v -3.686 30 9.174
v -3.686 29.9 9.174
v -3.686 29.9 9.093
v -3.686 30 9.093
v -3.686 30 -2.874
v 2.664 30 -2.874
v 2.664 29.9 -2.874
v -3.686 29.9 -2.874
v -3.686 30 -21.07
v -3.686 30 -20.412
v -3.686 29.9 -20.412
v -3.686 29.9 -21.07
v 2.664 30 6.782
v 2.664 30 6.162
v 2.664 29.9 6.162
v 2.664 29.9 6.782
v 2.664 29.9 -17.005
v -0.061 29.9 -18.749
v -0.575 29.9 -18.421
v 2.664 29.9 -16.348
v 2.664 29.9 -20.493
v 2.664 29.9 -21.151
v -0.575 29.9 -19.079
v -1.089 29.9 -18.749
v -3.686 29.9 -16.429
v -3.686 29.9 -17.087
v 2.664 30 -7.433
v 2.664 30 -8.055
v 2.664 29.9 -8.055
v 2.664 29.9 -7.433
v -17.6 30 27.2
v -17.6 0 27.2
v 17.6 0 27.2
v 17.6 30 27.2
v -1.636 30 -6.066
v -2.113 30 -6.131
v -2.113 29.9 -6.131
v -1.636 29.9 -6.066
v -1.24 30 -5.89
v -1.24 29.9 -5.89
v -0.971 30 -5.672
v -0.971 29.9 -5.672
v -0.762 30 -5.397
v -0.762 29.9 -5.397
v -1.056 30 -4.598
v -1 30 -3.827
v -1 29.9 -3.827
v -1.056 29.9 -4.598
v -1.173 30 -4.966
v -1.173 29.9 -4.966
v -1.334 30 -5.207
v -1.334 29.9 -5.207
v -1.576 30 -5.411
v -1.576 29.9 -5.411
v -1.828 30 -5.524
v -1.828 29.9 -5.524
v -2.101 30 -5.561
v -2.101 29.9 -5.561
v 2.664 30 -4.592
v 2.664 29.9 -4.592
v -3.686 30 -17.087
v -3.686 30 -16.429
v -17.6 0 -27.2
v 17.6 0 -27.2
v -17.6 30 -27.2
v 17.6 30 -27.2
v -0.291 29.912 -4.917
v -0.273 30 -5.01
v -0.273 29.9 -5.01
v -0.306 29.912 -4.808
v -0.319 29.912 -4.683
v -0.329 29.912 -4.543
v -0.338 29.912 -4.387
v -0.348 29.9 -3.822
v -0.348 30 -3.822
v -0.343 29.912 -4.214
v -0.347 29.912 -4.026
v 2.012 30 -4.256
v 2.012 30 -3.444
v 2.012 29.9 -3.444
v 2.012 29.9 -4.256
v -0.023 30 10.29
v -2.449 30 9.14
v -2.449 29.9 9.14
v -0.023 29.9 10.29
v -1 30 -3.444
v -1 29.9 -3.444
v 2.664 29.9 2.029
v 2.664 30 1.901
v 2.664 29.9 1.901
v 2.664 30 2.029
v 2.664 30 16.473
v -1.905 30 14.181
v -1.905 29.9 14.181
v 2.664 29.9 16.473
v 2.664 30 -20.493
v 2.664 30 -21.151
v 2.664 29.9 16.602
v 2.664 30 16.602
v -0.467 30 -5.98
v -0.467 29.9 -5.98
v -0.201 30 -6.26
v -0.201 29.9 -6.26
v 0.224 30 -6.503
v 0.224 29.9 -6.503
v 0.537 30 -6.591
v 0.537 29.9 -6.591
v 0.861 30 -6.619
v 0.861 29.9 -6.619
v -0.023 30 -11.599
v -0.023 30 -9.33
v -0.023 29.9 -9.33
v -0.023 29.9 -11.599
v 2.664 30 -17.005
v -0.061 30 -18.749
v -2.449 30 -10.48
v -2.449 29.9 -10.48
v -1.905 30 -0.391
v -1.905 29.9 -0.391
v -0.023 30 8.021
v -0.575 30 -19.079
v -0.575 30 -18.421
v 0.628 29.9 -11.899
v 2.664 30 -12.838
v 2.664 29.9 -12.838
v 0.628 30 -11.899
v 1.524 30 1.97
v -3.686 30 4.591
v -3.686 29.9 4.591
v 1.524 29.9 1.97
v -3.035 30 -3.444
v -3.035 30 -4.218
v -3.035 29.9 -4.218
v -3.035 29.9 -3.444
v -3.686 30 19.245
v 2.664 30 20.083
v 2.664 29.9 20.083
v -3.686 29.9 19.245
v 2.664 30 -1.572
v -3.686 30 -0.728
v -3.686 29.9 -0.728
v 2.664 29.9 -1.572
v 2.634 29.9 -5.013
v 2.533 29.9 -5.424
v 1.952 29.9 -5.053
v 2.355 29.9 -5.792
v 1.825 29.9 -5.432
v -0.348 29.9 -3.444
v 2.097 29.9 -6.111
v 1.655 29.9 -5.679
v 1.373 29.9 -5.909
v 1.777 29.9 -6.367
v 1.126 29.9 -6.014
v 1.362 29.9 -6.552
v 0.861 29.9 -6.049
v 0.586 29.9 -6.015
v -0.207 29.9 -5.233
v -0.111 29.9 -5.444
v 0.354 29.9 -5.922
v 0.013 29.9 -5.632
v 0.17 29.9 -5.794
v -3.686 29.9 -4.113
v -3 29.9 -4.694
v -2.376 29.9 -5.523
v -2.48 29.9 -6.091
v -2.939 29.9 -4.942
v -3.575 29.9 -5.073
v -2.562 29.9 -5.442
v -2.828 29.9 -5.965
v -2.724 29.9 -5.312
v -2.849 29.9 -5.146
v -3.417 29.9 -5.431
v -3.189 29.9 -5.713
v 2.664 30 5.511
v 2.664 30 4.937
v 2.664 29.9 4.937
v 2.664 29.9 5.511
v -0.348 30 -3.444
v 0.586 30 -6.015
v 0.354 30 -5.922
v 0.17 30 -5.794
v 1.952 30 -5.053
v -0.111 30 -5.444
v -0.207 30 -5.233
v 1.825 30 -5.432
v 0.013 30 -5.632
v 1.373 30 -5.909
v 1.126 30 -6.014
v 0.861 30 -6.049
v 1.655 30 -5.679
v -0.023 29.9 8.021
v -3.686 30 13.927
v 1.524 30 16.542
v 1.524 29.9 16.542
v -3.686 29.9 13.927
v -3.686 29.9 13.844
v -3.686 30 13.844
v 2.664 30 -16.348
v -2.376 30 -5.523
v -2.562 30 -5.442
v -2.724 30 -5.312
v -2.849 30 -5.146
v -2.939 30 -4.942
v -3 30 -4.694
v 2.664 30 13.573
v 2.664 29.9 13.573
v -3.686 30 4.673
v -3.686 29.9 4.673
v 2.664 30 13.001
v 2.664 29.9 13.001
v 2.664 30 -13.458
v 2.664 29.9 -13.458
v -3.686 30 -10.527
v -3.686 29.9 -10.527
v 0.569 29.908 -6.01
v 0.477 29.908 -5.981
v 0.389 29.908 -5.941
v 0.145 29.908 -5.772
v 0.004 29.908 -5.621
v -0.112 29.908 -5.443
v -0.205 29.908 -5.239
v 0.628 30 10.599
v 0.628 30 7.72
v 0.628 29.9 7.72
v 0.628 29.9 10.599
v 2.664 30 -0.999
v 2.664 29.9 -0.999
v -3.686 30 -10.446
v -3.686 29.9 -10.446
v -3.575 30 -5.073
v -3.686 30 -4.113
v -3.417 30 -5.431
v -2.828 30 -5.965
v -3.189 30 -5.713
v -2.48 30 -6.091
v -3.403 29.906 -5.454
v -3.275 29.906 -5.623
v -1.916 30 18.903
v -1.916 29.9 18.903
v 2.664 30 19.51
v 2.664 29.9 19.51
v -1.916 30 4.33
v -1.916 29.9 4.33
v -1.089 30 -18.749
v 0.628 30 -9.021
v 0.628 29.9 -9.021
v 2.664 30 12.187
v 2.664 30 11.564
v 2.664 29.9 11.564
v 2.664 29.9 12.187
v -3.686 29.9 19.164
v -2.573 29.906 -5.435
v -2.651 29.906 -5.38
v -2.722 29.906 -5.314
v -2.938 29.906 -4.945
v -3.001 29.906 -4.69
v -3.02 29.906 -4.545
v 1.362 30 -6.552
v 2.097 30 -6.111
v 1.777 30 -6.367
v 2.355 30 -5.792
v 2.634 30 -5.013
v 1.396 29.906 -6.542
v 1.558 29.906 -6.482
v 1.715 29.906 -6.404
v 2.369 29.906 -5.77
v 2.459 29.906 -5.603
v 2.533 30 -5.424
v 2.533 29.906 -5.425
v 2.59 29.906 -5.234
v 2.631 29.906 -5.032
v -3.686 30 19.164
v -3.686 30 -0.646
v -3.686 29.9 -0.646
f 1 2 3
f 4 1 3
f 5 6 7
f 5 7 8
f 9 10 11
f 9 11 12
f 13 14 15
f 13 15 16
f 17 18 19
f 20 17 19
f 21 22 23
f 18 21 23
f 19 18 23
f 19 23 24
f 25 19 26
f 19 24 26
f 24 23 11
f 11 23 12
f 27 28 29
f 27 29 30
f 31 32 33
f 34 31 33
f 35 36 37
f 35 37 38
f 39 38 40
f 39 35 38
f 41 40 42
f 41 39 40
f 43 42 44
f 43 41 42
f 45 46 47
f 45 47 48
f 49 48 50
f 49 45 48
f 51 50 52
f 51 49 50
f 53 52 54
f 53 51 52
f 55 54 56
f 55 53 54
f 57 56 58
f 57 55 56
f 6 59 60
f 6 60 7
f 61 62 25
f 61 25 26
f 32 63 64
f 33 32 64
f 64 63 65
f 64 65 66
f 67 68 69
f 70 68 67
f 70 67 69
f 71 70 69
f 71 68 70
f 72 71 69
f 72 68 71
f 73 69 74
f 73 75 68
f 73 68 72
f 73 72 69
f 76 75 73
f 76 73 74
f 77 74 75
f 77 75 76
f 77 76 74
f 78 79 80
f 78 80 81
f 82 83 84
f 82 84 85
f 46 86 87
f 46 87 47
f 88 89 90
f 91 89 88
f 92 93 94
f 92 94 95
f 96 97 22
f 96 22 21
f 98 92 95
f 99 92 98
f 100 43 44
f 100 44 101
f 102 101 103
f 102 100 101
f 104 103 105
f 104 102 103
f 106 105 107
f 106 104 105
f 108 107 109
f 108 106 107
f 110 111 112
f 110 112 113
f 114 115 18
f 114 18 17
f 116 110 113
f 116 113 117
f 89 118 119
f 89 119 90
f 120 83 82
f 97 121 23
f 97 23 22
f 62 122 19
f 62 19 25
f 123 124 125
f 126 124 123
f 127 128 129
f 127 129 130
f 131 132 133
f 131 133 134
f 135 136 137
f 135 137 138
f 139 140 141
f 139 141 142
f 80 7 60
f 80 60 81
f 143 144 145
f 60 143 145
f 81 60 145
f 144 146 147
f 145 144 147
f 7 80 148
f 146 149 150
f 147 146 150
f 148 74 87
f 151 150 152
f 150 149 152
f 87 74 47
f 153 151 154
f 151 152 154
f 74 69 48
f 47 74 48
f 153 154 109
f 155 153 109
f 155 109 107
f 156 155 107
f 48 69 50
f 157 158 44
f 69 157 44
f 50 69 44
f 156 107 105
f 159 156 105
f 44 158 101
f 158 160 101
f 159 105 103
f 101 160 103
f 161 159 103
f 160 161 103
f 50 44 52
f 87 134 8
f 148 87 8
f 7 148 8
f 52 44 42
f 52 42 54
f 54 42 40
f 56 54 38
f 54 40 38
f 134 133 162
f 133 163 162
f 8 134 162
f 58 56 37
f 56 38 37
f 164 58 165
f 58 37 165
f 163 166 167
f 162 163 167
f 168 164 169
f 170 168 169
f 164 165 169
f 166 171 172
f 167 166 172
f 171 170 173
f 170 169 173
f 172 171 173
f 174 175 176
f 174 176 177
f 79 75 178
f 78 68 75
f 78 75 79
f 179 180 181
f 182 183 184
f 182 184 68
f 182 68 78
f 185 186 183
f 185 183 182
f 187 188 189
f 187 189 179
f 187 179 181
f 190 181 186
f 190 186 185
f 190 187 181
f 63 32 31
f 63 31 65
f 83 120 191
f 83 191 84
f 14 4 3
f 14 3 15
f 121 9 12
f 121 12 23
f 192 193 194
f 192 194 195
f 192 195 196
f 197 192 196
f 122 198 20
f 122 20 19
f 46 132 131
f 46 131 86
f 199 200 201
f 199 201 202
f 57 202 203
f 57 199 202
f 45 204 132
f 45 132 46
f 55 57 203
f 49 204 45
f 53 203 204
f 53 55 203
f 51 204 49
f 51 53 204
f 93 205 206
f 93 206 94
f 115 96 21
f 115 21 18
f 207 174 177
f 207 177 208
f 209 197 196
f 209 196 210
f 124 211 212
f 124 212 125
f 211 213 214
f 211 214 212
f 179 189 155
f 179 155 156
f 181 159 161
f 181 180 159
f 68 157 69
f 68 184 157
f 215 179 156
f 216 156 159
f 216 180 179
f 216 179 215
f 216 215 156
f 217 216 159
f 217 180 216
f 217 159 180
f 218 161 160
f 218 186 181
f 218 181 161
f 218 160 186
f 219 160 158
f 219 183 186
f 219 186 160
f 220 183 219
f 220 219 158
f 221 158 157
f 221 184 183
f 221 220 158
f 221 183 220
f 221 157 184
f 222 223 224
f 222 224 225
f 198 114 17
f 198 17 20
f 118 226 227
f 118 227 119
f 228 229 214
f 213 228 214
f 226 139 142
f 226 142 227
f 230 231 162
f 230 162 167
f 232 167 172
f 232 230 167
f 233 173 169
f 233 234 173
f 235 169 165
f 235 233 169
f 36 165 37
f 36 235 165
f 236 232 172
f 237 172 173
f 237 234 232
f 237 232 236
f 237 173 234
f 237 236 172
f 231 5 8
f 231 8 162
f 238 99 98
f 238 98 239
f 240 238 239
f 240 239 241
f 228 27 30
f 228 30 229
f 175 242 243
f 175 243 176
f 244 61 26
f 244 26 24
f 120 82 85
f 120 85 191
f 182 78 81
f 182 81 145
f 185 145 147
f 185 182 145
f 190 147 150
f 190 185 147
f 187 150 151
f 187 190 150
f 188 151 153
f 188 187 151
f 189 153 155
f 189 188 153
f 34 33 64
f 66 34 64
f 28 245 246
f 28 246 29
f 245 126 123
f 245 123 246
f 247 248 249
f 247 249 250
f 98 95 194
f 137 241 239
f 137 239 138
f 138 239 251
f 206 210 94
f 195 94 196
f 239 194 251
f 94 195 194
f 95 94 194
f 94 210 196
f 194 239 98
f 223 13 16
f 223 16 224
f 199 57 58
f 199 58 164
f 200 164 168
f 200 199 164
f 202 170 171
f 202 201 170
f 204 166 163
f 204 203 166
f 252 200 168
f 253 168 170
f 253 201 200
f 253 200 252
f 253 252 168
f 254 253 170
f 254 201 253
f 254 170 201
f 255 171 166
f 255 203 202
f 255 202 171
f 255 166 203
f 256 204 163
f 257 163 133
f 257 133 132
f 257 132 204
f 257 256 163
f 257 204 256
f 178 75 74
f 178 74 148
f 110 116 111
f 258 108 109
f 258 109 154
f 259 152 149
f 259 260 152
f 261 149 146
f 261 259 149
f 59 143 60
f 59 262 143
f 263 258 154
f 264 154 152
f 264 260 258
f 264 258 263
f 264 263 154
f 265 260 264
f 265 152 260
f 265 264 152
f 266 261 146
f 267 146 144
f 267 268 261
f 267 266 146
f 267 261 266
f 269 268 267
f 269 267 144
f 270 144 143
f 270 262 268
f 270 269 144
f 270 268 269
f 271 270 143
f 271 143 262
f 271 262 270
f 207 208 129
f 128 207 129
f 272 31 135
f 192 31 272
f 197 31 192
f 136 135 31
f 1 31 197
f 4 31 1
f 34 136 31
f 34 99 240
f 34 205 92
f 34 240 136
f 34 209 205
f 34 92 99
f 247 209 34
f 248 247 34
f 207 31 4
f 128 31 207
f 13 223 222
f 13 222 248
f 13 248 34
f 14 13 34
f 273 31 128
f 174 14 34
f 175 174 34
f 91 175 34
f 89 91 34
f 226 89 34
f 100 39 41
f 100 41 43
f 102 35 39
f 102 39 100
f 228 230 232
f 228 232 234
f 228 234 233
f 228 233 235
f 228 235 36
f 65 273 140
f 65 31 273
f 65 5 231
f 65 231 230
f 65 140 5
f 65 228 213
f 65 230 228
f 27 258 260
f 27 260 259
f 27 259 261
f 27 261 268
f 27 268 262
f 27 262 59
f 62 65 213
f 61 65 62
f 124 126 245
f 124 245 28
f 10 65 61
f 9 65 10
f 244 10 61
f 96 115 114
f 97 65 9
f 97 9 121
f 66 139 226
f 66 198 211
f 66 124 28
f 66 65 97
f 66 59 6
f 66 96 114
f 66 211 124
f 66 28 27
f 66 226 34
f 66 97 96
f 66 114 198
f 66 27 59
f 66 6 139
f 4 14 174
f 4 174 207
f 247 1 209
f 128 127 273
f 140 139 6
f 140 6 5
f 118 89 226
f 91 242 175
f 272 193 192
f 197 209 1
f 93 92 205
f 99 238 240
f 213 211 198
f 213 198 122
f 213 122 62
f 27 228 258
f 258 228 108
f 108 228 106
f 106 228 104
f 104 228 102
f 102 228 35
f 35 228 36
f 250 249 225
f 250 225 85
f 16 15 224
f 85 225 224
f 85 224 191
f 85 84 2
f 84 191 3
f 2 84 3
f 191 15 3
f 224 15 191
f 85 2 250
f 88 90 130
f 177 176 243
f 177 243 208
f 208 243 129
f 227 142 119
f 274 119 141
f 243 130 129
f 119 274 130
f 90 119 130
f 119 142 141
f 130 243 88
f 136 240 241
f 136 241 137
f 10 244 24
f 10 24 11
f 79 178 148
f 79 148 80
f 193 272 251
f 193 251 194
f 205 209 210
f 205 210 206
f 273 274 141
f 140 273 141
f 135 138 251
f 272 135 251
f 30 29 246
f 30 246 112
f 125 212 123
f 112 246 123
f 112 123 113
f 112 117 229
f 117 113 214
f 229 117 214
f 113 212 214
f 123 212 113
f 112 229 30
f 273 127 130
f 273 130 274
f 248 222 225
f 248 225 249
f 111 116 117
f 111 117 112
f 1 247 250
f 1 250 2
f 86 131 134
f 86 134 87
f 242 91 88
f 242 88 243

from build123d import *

# Parameters (mm, degrees)
SKETCH1_W           = 35.2
SKETCH1_H           = 54.4
BOSS_EXTRUDE1_DEPTH = 30
CUT_EXTRUDE1_DEPTH  = 0.1


with BuildPart() as part:
    # Sketch1 → Boss-Extrude1 (new body)
    with BuildSketch(Plane(origin=(0, 0, 0), x_dir=(1, 0, 0), z_dir=(0, 1, 0))):
        Rectangle(SKETCH1_W, SKETCH1_H)
    extrude(amount=BOSS_EXTRUDE1_DEPTH)

    # Sketch2 → Cut-Extrude1 (cut)
    # profile 1 of 6: a face of its own
    with BuildSketch(Plane(origin=(0, 30, 0), x_dir=(1, 0, 0), z_dir=(0, 1, 0))):
        Polygon((2.663738641, -20.083303144), (-3.686261359, -19.24503191), (-3.686261359, -19.163621654), (1.523995051, -16.54195699), (-3.686261359, -13.926652503), (-3.686261359, -13.843970211), (2.663738641, -13.000610836), (2.663738641, -13.573026702), (-1.905412, -14.181059554), (2.663738641, -16.473267086), (2.663738641, -16.601742647), (-1.915588282, -18.902854426), (2.663738641, -19.509615243), align=None)
    # profile 2 of 6: a face of its own
    with BuildSketch(Plane(origin=(0, 30, 0), x_dir=(1, 0, 0), z_dir=(0, 1, 0))):
        Polygon((-3.686261359, -9.092918529), (2.663738641, -6.162149298), (2.663738641, -6.781630468), (0.62848223, -7.720392487), (0.62848223, -10.599008272), (2.663738641, -11.564483032), (2.663738641, -12.186508272), (-3.686261359, -9.174328785), align=None)
        Polygon((-2.448571055, -9.139983833), (-0.022799821, -10.289903705), (-0.022799821, -8.020592808), align=None, mode=Mode.SUBTRACT)
    # profile 3 of 6: a face of its own
    with BuildSketch(Plane(origin=(0, 30, 0), x_dir=(1, 0, 0), z_dir=(0, 1, 0))):
        Polygon((2.663738641, -5.510867247), (-3.686261359, -4.672596013), (-3.686261359, -4.591185756), (1.523995051, -1.969521093), (-3.686261359, 0.645783394), (-3.686261359, 0.728465686), (2.663738641, 1.571825061), (2.663738641, 0.999409196), (-1.905412, 0.391376343), (2.663738641, -1.900831189), (2.663738641, -2.02930675), (-1.915588282, -4.330418529), (2.663738641, -4.937179346), align=None)
    # profile 4 of 6: a face of its own
    with BuildSketch(Plane(origin=(0, 30, 0), x_dir=(1, 0, 0), z_dir=(0, 1, 0))):
        with BuildLine():
            Line((-3.686261359, 2.874389164), (-3.686261359, 4.113351503))
            add(Edge.make_bspline(
                [(-3.686261359, 4.113351503), (-3.685947518, 4.17400127), (-3.685339215, 4.291555613), (-3.675685885, 4.462483602), (-3.662852695, 4.622637187), (-3.641325711, 4.771733359), (-3.619005068, 4.910742263), (-3.586243707, 5.038252668), (-3.55005759, 5.15533263), (-3.494380339, 5.295921701), (-3.407912866, 5.455439265), (-3.279673387, 5.626890799), (-3.125924606, 5.775926934), (-2.950715744, 5.902651825), (-2.75796614, 6.004351247), (-2.551822866, 6.076995491), (-2.335754034, 6.12366492), (-2.187618873, 6.128404243), (-2.112753747, 6.13079942)],
                knots=[0, 0, 0, 0, 1.00128172, 1.940733171, 2.826250472, 3.653024905, 4.427672124, 5.149348099, 5.824709082, 6.450061444, 7.643590664, 8.808605388, 9.972104426, 11.165284501, 12.367876273, 13.557044126, 14.765369432, 16, 16, 16, 16], degree=3))
            add(Edge.make_bspline(
                [(-2.112753747, 6.13079942), (-2.042630051, 6.128804412), (-1.904830375, 6.124884033), (-1.703630007, 6.087852701), (-1.512300219, 6.029078685), (-1.33100476, 5.947850624), (-1.163118461, 5.843192811), (-1.009161388, 5.717798041), (-0.874952272, 5.567137227), (-0.79995004, 5.454201374), (-0.761852305, 5.396835077)],
                knots=[0, 0, 0, 0, 1.044641374, 2.052818814, 3.038628718, 4.023282556, 5.005660861, 5.98021751, 6.974042014, 8, 8, 8, 8], degree=3))
            add(Edge.make_bspline(
                [(-0.761852305, 5.396835077), (-0.734148267, 5.468964887), (-0.681143581, 5.606967082), (-0.587578442, 5.796987788), (-0.485443149, 5.960105657), (-0.375629467, 6.099507114), (-0.255516262, 6.218101669), (-0.124127669, 6.320811412), (0.018428749, 6.409605986), (0.171629053, 6.485169554), (0.334174493, 6.544525679), (0.504079737, 6.588151608), (0.680693455, 6.613957294), (0.80054706, 6.617477585), (0.861264682, 6.619260959)],
                knots=[0, 0, 0, 0, 1.272586185, 2.434772614, 3.483318042, 4.437947805, 5.351807173, 6.25737843, 7.180033415, 8.1141739, 9.066731021, 10.025721652, 10.999834114, 12, 12, 12, 12], degree=3))
            add(Edge.make_bspline(
                [(0.861264682, 6.619260959), (0.923253403, 6.617489068), (1.045217946, 6.614002824), (1.224384373, 6.588270771), (1.395620732, 6.544731726), (1.559955701, 6.484656401), (1.717044728, 6.40678878), (1.86631873, 6.310656843), (2.008088271, 6.19761009), (2.142603557, 6.069848985), (2.265689272, 5.92746923), (2.371501477, 5.770557575), (2.462484894, 5.603412637), (2.536560348, 5.423897625), (2.593709512, 5.232470806), (2.633526759, 5.029238698), (2.660400578, 4.814535995), (2.662607073, 4.667197225), (2.663738641, 4.59163676)],
                knots=[0, 0, 0, 0, 0.978680899, 1.925582087, 2.851223405, 3.764209995, 4.683484765, 5.614004905, 6.562443559, 7.542772147, 8.539900013, 9.527881485, 10.525548727, 11.540192123, 12.58875426, 13.674701727, 14.807505862, 16, 16, 16, 16], degree=3))
            Line((2.663738641, 4.59163676), (2.663738641, 2.874389164))
            Line((2.663738641, 2.874389164), (-3.686261359, 2.874389164))
        make_face()
        with BuildLine():
            Line((-3.034979308, 3.444260959), (-0.999722898, 3.444260959))
            Line((-0.999722898, 3.444260959), (-0.999722898, 3.827143571))
            add(Edge.make_bspline(
                [(-0.999722898, 3.827143571), (-1.000448472, 3.8831121), (-1.00185043, 3.991254703), (-1.005866384, 4.147863657), (-1.017111401, 4.293233338), (-1.028353206, 4.427112788), (-1.046631335, 4.549291282), (-1.068388642, 4.659497805), (-1.091398506, 4.759463042), (-1.130534038, 4.874739232), (-1.188353511, 5.005518464), (-1.278171729, 5.144843329), (-1.385066749, 5.268239823), (-1.509562523, 5.371191651), (-1.645160313, 5.456193757), (-1.790669697, 5.515740405), (-1.943162486, 5.555438382), (-2.048051128, 5.559079134), (-2.10130543, 5.560927625)],
                knots=[0, 0, 0, 0, 1.156917035, 2.235399477, 3.236897345, 4.169954739, 5.01148057, 5.788325709, 6.491867502, 7.129259015, 8.302032419, 9.437271567, 10.542795419, 11.662606952, 12.764338259, 13.836858145, 14.901724648, 16, 16, 16, 16], degree=3))
            add(Edge.make_bspline(
                [(-2.10130543, 5.560927625), (-2.13655395, 5.559989075), (-2.205697771, 5.558148007), (-2.306820964, 5.542521884), (-2.401839674, 5.517203418), (-2.491665842, 5.48291539), (-2.574067073, 5.436072855), (-2.65298071, 5.381776203), (-2.723680212, 5.314739278), (-2.789569329, 5.2389816), (-2.848539868, 5.152301304), (-2.897387819, 5.052830862), (-2.941660294, 4.943141736), (-2.97443389, 4.820258001), (-3.00325313, 4.686725849), (-3.021360451, 4.540737206), (-3.033012685, 4.38321717), (-3.034309145, 4.27407557), (-3.034979308, 4.217658394)],
                knots=[0, 0, 0, 0, 0.911708768, 1.788416306, 2.640049961, 3.452993646, 4.268229297, 5.087074648, 5.92553149, 6.781184137, 7.681934069, 8.628939405, 9.643570426, 10.73771997, 11.914765019, 13.176320755, 14.540391495, 16, 16, 16, 16], degree=3))
            Line((-3.034979308, 4.217658394), (-3.034979308, 3.444260959))
        make_face(mode=Mode.SUBTRACT)
        with BuildLine():
            Line((-0.348440847, 3.444260959), (2.012456589, 3.444260959))
            Line((2.012456589, 3.444260959), (2.012456589, 4.255819452))
            add(Edge.make_bspline(
                [(2.012456589, 4.255819452), (2.011691133, 4.313904856), (2.010215818, 4.425856815), (2.006755897, 4.587623502), (1.993667542, 4.737164959), (1.981593593, 4.874952938), (1.960947659, 5.000621747), (1.941463265, 5.115138039), (1.912540074, 5.21662195), (1.872788551, 5.335381604), (1.809151298, 5.468127448), (1.716177872, 5.613194762), (1.601434311, 5.739691211), (1.470935241, 5.848276604), (1.329434427, 5.937885986), (1.17878172, 6.002189193), (1.02190703, 6.0421495), (0.914919928, 6.046971084), (0.861264682, 6.049389164)],
                knots=[0, 0, 0, 0, 1.160376723, 2.23647316, 3.230273494, 4.158083346, 4.997711197, 5.773399541, 6.476071462, 7.102777513, 8.27340052, 9.405620712, 10.53304798, 11.669441455, 12.787990954, 13.865552736, 14.929550474, 16, 16, 16, 16], degree=3))
            add(Edge.make_bspline(
                [(0.861264682, 6.049389164), (0.827711756, 6.048889766), (0.761147116, 6.047899025), (0.66333895, 6.032889544), (0.568547371, 6.011175582), (0.476377366, 5.982577669), (0.388378653, 5.942599328), (0.304213755, 5.893589233), (0.222187198, 5.837488471), (0.117145087, 5.750935608), (-0.002378264, 5.623205662), (-0.117953532, 5.441687154), (-0.212666344, 5.236433762), (-0.252706867, 5.087217582), (-0.273390766, 5.010136359)],
                knots=[0, 0, 0, 0, 0.723302347, 1.434937762, 2.129609326, 2.821140842, 3.513216847, 4.209993937, 4.920569932, 5.655069131, 7.14393391, 8.6716197, 10.280644748, 12, 12, 12, 12], degree=3))
            add(Edge.make_bspline(
                [(-0.273390766, 5.010136359), (-0.279659276, 4.979240714), (-0.293250697, 4.912252582), (-0.307597531, 4.803018829), (-0.320379282, 4.678312324), (-0.329833811, 4.537845104), (-0.33960654, 4.381439449), (-0.343407144, 4.208761325), (-0.347941516, 4.020515912), (-0.348270145, 3.889901179), (-0.348440847, 3.82205543)],
                knots=[0, 0, 0, 0, 0.634451884, 1.375622551, 2.216452059, 3.157844607, 4.20941857, 5.370758133, 6.634282058, 8, 8, 8, 8], degree=3))
            Line((-0.348440847, 3.82205543), (-0.348440847, 3.444260959))
        make_face(mode=Mode.SUBTRACT)
    # profile 5 of 6: a face of its own
    with BuildSketch(Plane(origin=(0, 30, 0), x_dir=(1, 0, 0), z_dir=(0, 1, 0))):
        Polygon((-3.686261359, 10.526953266), (2.663738641, 13.457722497), (2.663738641, 12.838241327), (0.62848223, 11.899479308), (0.62848223, 9.020863523), (2.663738641, 8.055388763), (2.663738641, 7.433363523), (-3.686261359, 10.44554301), align=None)
        Polygon((-2.448571055, 10.479887962), (-0.022799821, 9.32996809), (-0.022799821, 11.599278987), align=None, mode=Mode.SUBTRACT)
    # profile 6 of 6: a face of its own
    with BuildSketch(Plane(origin=(0, 30, 0), x_dir=(1, 0, 0), z_dir=(0, 1, 0))):
        Polygon((-3.686261359, 16.429196856), (-3.686261359, 17.086839084), (-1.088765366, 18.749389164), (-3.686261359, 20.411939244), (-3.686261359, 21.069581471), (-0.574863122, 19.078846295), (2.663738641, 21.150991728), (2.663738641, 20.4933495), (-0.060960879, 18.749389164), (2.663738641, 17.005428827), (2.663738641, 16.3477866), (-0.574863122, 18.421204067), align=None)
    extrude(amount=-CUT_EXTRUDE1_DEPTH, mode=Mode.SUBTRACT)


solid = part.part
